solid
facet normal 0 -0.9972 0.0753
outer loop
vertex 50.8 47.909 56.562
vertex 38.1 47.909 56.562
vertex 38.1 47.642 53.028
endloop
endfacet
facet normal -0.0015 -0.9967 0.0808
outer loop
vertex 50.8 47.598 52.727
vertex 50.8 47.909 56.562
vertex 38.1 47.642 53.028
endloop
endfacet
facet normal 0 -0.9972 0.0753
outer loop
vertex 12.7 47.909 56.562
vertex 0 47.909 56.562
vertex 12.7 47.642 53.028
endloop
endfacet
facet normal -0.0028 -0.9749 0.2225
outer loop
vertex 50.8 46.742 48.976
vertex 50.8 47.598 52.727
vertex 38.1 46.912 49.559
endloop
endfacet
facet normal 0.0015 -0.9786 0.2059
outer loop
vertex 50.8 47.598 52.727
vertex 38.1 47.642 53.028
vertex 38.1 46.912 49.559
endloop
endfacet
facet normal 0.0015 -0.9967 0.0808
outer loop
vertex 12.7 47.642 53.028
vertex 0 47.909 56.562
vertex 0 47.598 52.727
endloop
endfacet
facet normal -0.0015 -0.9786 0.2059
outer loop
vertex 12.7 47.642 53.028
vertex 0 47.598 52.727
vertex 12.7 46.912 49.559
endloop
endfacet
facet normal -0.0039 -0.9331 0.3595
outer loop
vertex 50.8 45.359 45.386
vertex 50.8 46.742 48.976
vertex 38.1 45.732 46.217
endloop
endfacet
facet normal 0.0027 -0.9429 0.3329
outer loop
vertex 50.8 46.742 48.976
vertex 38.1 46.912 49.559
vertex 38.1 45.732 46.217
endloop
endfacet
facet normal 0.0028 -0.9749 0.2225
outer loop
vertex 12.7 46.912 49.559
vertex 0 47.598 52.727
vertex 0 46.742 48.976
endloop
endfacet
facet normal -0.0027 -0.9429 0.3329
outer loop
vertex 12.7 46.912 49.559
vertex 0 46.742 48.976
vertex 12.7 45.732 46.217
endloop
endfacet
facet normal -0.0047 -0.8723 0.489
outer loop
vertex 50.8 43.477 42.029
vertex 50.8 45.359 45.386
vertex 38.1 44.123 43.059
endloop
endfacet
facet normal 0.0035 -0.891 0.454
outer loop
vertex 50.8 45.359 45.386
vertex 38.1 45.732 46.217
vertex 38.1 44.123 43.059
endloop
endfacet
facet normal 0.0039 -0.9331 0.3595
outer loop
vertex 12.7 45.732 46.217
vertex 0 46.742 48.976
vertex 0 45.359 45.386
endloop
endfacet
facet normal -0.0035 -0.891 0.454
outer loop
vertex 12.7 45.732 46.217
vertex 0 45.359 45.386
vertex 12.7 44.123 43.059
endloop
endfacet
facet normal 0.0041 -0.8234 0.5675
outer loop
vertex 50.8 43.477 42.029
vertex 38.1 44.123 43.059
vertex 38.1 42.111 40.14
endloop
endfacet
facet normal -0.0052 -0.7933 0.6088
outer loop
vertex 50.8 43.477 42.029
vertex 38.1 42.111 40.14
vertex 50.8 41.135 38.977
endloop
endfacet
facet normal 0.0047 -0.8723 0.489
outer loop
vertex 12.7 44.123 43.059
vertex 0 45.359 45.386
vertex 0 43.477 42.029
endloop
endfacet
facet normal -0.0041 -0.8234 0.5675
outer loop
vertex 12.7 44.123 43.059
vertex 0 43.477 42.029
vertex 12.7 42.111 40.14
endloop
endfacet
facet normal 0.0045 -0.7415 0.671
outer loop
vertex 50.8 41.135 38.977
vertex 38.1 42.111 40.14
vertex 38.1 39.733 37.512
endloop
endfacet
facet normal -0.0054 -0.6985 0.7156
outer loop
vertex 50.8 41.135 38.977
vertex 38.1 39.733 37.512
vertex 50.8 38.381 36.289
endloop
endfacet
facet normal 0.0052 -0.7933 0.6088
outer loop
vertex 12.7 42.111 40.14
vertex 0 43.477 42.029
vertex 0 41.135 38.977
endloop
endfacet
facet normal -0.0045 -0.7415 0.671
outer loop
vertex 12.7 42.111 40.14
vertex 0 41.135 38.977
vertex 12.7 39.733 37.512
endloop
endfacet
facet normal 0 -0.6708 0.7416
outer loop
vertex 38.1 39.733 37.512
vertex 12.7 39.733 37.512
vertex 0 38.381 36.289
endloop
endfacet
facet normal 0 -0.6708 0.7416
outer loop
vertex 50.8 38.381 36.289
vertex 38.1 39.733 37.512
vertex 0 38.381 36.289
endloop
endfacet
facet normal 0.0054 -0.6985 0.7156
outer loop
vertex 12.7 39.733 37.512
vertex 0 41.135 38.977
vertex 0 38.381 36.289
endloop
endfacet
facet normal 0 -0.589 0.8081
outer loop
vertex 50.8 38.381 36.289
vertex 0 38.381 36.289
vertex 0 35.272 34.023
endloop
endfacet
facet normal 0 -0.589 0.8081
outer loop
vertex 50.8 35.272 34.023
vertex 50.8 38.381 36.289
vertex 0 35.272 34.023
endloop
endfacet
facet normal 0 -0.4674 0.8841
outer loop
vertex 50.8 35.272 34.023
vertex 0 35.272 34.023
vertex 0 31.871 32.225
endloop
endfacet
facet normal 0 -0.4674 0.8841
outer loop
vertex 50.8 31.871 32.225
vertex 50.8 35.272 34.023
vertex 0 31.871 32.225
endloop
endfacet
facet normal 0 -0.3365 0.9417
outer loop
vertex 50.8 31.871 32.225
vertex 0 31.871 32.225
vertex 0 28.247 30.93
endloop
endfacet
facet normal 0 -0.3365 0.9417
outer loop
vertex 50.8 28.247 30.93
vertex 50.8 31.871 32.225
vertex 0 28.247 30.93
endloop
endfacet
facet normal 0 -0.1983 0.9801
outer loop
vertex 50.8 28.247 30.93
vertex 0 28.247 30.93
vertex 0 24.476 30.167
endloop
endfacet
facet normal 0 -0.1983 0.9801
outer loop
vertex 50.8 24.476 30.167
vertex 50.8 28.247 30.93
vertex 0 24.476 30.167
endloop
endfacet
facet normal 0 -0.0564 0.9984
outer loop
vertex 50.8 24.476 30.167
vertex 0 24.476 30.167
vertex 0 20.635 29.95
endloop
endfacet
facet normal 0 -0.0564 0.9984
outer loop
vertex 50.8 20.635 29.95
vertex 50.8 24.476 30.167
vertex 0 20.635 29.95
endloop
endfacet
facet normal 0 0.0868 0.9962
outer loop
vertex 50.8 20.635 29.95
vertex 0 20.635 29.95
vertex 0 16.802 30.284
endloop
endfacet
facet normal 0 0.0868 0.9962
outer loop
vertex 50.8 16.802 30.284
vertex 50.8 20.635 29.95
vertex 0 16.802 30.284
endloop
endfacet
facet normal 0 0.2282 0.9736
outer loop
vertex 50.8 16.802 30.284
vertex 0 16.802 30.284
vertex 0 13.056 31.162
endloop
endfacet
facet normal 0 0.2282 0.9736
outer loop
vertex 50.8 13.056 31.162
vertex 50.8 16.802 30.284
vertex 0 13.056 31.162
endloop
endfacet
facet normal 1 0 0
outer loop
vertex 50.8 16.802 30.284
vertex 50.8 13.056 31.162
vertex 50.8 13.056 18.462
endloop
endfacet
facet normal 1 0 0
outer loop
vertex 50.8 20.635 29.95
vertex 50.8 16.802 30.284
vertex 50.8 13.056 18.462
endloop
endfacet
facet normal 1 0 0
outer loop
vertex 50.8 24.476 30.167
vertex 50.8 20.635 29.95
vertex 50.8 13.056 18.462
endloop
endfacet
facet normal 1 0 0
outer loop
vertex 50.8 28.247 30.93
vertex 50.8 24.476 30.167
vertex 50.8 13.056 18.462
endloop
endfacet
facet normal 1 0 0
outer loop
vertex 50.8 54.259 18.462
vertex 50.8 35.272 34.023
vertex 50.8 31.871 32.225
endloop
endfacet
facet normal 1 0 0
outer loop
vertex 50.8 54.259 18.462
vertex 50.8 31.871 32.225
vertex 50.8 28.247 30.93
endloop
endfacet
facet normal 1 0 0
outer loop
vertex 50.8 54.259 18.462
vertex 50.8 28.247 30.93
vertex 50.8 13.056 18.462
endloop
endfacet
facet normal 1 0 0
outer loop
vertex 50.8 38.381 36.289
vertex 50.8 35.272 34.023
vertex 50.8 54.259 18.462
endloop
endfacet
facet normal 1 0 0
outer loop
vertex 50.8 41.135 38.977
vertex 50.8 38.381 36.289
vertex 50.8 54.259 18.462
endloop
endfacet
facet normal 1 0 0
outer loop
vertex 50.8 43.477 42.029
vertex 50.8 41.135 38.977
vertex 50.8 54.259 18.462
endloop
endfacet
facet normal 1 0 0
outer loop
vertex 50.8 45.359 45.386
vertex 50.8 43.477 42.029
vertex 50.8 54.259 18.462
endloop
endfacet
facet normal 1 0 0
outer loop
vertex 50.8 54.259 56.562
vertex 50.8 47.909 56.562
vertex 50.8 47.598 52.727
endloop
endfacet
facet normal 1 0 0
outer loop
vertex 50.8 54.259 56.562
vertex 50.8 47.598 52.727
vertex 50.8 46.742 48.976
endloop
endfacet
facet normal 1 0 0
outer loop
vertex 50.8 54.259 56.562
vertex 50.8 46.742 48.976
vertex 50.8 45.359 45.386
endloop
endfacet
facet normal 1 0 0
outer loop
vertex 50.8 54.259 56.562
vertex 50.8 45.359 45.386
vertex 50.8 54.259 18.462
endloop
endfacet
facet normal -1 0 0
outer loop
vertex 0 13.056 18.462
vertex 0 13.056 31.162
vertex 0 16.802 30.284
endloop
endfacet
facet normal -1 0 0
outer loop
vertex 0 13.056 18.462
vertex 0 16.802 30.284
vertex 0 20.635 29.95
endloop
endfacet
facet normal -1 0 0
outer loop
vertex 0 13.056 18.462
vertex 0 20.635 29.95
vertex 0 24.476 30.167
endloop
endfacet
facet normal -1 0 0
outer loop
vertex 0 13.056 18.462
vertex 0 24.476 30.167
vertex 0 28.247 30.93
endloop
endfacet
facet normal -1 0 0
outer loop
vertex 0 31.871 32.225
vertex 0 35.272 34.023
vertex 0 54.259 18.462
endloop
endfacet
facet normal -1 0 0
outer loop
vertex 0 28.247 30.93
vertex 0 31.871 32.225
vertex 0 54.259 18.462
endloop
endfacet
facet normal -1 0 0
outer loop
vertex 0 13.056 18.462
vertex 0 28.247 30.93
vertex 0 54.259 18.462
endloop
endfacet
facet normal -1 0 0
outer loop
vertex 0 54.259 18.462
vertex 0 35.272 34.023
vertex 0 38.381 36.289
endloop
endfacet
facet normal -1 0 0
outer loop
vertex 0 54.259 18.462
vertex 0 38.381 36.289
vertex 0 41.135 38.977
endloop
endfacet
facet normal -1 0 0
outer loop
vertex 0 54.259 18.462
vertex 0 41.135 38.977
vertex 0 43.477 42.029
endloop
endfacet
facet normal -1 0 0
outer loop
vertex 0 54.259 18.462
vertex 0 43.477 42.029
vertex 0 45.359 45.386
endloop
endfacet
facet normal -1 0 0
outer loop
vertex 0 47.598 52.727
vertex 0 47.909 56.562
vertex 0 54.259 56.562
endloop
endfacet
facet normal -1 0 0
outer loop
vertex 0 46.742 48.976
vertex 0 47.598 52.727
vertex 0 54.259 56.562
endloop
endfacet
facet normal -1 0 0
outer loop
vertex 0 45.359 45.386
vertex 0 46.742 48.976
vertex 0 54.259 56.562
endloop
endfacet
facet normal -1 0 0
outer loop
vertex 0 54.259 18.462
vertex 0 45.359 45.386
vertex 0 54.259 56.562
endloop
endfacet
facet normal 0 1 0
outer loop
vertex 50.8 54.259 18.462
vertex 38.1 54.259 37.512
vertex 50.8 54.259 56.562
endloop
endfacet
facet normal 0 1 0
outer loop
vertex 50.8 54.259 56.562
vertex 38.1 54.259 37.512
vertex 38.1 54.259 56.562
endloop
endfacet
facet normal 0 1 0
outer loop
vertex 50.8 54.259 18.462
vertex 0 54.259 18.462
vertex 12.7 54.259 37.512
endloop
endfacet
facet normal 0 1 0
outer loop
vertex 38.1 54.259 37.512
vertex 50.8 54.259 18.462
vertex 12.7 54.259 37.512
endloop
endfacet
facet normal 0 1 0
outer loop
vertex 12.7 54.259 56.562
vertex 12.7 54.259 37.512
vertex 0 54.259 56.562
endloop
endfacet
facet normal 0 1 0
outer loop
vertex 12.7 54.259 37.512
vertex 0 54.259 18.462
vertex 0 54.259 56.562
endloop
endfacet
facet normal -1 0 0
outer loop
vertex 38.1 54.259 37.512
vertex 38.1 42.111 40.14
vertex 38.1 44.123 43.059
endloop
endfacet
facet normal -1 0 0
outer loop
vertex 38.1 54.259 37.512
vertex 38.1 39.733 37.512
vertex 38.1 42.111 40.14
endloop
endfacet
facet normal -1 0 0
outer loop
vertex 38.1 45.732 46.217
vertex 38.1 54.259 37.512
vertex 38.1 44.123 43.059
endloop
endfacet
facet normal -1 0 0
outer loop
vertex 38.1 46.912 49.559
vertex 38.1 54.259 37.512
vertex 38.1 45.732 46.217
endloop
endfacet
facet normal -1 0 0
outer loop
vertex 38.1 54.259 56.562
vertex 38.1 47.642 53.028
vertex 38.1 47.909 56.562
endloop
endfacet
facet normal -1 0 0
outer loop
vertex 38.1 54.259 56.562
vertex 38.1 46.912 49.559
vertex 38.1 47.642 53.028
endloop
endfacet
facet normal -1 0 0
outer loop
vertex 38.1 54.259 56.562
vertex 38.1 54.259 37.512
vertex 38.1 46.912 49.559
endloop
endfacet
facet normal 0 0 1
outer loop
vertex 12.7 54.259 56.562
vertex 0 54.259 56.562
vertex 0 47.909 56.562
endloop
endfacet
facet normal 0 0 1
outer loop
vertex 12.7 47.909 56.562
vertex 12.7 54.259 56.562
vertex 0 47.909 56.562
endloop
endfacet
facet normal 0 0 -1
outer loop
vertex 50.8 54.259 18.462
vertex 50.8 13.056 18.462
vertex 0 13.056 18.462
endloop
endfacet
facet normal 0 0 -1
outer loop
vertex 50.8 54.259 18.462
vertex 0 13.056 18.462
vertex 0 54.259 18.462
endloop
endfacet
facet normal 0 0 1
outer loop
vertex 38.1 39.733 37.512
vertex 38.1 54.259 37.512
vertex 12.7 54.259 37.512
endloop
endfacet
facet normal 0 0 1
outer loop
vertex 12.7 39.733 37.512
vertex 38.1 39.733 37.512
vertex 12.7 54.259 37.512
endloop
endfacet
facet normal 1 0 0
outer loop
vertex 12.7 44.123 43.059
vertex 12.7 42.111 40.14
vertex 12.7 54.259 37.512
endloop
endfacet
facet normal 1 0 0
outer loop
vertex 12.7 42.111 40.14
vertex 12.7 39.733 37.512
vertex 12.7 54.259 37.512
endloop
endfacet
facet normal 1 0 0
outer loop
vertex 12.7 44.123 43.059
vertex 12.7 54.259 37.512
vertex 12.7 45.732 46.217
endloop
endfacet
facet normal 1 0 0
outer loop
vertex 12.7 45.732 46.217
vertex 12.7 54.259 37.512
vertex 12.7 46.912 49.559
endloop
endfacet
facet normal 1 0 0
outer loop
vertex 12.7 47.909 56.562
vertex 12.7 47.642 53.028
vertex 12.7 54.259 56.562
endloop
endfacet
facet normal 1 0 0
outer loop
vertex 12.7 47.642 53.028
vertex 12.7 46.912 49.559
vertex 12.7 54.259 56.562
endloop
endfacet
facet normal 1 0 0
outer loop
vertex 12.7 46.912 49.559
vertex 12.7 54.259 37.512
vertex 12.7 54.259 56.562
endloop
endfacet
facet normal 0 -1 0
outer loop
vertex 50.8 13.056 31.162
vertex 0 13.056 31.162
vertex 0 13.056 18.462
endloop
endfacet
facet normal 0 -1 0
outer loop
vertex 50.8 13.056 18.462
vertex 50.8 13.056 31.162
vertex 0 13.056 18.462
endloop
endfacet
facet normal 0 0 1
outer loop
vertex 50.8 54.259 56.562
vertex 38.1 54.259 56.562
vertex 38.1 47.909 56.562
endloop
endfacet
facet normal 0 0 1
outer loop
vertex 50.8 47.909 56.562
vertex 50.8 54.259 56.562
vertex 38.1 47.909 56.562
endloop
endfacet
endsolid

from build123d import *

# Parameters (mm, degrees)
F1_DEPTH = 50.8
F3_DEPTH = 50.8
F4_W     = 25.4
F4_H     = 19.05
F5_DEPTH = 19.05
F6_W     = 25.4
F6_H     = 19.05
F7_DEPTH = 19.05


with BuildPart() as f1:
    # F0 (on Right) → F1 (new body)
    with BuildSketch(Plane.YZ):
        Polygon((54.258809, 18.462197), (54.258809, 56.562197), (47.908809, 56.562197), (13.055639, 31.162197), (13.055639, 18.462197), align=None)
    extrude(amount=F1_DEPTH)

    # F2 (on face) → F3 (cut)
    with BuildSketch(Plane(origin=(0, 0, 0), x_dir=(0, -1, 0), z_dir=(-1, 0, 0))):
        with BuildLine():
            Line((-13.055639, 31.162197), (-47.908809, 56.562197))
            ThreePointArc((-47.908809, 56.562197), (-36.867348, 35.100708), (-13.055639, 31.162197))
        make_face()
    extrude(amount=-F3_DEPTH, mode=Mode.SUBTRACT)

    # F4 (on Front) → F5 (cut)
    with BuildSketch(Plane.XZ):
        with Locations((25.4, 49.807958)):
            Rectangle(F4_W, F4_H)
    extrude(amount=-F5_DEPTH, mode=Mode.SUBTRACT)

    # F6 (on face) → F7 (cut)
    with BuildSketch(Plane(origin=(0, 54.258809, 0), x_dir=(-1, 0, 0), z_dir=(0, 1, 0))):
        with Locations((-25.4, 47.037197)):
            Rectangle(F6_W, F6_H)
    extrude(amount=-F7_DEPTH, mode=Mode.SUBTRACT)


solid = f1.part
